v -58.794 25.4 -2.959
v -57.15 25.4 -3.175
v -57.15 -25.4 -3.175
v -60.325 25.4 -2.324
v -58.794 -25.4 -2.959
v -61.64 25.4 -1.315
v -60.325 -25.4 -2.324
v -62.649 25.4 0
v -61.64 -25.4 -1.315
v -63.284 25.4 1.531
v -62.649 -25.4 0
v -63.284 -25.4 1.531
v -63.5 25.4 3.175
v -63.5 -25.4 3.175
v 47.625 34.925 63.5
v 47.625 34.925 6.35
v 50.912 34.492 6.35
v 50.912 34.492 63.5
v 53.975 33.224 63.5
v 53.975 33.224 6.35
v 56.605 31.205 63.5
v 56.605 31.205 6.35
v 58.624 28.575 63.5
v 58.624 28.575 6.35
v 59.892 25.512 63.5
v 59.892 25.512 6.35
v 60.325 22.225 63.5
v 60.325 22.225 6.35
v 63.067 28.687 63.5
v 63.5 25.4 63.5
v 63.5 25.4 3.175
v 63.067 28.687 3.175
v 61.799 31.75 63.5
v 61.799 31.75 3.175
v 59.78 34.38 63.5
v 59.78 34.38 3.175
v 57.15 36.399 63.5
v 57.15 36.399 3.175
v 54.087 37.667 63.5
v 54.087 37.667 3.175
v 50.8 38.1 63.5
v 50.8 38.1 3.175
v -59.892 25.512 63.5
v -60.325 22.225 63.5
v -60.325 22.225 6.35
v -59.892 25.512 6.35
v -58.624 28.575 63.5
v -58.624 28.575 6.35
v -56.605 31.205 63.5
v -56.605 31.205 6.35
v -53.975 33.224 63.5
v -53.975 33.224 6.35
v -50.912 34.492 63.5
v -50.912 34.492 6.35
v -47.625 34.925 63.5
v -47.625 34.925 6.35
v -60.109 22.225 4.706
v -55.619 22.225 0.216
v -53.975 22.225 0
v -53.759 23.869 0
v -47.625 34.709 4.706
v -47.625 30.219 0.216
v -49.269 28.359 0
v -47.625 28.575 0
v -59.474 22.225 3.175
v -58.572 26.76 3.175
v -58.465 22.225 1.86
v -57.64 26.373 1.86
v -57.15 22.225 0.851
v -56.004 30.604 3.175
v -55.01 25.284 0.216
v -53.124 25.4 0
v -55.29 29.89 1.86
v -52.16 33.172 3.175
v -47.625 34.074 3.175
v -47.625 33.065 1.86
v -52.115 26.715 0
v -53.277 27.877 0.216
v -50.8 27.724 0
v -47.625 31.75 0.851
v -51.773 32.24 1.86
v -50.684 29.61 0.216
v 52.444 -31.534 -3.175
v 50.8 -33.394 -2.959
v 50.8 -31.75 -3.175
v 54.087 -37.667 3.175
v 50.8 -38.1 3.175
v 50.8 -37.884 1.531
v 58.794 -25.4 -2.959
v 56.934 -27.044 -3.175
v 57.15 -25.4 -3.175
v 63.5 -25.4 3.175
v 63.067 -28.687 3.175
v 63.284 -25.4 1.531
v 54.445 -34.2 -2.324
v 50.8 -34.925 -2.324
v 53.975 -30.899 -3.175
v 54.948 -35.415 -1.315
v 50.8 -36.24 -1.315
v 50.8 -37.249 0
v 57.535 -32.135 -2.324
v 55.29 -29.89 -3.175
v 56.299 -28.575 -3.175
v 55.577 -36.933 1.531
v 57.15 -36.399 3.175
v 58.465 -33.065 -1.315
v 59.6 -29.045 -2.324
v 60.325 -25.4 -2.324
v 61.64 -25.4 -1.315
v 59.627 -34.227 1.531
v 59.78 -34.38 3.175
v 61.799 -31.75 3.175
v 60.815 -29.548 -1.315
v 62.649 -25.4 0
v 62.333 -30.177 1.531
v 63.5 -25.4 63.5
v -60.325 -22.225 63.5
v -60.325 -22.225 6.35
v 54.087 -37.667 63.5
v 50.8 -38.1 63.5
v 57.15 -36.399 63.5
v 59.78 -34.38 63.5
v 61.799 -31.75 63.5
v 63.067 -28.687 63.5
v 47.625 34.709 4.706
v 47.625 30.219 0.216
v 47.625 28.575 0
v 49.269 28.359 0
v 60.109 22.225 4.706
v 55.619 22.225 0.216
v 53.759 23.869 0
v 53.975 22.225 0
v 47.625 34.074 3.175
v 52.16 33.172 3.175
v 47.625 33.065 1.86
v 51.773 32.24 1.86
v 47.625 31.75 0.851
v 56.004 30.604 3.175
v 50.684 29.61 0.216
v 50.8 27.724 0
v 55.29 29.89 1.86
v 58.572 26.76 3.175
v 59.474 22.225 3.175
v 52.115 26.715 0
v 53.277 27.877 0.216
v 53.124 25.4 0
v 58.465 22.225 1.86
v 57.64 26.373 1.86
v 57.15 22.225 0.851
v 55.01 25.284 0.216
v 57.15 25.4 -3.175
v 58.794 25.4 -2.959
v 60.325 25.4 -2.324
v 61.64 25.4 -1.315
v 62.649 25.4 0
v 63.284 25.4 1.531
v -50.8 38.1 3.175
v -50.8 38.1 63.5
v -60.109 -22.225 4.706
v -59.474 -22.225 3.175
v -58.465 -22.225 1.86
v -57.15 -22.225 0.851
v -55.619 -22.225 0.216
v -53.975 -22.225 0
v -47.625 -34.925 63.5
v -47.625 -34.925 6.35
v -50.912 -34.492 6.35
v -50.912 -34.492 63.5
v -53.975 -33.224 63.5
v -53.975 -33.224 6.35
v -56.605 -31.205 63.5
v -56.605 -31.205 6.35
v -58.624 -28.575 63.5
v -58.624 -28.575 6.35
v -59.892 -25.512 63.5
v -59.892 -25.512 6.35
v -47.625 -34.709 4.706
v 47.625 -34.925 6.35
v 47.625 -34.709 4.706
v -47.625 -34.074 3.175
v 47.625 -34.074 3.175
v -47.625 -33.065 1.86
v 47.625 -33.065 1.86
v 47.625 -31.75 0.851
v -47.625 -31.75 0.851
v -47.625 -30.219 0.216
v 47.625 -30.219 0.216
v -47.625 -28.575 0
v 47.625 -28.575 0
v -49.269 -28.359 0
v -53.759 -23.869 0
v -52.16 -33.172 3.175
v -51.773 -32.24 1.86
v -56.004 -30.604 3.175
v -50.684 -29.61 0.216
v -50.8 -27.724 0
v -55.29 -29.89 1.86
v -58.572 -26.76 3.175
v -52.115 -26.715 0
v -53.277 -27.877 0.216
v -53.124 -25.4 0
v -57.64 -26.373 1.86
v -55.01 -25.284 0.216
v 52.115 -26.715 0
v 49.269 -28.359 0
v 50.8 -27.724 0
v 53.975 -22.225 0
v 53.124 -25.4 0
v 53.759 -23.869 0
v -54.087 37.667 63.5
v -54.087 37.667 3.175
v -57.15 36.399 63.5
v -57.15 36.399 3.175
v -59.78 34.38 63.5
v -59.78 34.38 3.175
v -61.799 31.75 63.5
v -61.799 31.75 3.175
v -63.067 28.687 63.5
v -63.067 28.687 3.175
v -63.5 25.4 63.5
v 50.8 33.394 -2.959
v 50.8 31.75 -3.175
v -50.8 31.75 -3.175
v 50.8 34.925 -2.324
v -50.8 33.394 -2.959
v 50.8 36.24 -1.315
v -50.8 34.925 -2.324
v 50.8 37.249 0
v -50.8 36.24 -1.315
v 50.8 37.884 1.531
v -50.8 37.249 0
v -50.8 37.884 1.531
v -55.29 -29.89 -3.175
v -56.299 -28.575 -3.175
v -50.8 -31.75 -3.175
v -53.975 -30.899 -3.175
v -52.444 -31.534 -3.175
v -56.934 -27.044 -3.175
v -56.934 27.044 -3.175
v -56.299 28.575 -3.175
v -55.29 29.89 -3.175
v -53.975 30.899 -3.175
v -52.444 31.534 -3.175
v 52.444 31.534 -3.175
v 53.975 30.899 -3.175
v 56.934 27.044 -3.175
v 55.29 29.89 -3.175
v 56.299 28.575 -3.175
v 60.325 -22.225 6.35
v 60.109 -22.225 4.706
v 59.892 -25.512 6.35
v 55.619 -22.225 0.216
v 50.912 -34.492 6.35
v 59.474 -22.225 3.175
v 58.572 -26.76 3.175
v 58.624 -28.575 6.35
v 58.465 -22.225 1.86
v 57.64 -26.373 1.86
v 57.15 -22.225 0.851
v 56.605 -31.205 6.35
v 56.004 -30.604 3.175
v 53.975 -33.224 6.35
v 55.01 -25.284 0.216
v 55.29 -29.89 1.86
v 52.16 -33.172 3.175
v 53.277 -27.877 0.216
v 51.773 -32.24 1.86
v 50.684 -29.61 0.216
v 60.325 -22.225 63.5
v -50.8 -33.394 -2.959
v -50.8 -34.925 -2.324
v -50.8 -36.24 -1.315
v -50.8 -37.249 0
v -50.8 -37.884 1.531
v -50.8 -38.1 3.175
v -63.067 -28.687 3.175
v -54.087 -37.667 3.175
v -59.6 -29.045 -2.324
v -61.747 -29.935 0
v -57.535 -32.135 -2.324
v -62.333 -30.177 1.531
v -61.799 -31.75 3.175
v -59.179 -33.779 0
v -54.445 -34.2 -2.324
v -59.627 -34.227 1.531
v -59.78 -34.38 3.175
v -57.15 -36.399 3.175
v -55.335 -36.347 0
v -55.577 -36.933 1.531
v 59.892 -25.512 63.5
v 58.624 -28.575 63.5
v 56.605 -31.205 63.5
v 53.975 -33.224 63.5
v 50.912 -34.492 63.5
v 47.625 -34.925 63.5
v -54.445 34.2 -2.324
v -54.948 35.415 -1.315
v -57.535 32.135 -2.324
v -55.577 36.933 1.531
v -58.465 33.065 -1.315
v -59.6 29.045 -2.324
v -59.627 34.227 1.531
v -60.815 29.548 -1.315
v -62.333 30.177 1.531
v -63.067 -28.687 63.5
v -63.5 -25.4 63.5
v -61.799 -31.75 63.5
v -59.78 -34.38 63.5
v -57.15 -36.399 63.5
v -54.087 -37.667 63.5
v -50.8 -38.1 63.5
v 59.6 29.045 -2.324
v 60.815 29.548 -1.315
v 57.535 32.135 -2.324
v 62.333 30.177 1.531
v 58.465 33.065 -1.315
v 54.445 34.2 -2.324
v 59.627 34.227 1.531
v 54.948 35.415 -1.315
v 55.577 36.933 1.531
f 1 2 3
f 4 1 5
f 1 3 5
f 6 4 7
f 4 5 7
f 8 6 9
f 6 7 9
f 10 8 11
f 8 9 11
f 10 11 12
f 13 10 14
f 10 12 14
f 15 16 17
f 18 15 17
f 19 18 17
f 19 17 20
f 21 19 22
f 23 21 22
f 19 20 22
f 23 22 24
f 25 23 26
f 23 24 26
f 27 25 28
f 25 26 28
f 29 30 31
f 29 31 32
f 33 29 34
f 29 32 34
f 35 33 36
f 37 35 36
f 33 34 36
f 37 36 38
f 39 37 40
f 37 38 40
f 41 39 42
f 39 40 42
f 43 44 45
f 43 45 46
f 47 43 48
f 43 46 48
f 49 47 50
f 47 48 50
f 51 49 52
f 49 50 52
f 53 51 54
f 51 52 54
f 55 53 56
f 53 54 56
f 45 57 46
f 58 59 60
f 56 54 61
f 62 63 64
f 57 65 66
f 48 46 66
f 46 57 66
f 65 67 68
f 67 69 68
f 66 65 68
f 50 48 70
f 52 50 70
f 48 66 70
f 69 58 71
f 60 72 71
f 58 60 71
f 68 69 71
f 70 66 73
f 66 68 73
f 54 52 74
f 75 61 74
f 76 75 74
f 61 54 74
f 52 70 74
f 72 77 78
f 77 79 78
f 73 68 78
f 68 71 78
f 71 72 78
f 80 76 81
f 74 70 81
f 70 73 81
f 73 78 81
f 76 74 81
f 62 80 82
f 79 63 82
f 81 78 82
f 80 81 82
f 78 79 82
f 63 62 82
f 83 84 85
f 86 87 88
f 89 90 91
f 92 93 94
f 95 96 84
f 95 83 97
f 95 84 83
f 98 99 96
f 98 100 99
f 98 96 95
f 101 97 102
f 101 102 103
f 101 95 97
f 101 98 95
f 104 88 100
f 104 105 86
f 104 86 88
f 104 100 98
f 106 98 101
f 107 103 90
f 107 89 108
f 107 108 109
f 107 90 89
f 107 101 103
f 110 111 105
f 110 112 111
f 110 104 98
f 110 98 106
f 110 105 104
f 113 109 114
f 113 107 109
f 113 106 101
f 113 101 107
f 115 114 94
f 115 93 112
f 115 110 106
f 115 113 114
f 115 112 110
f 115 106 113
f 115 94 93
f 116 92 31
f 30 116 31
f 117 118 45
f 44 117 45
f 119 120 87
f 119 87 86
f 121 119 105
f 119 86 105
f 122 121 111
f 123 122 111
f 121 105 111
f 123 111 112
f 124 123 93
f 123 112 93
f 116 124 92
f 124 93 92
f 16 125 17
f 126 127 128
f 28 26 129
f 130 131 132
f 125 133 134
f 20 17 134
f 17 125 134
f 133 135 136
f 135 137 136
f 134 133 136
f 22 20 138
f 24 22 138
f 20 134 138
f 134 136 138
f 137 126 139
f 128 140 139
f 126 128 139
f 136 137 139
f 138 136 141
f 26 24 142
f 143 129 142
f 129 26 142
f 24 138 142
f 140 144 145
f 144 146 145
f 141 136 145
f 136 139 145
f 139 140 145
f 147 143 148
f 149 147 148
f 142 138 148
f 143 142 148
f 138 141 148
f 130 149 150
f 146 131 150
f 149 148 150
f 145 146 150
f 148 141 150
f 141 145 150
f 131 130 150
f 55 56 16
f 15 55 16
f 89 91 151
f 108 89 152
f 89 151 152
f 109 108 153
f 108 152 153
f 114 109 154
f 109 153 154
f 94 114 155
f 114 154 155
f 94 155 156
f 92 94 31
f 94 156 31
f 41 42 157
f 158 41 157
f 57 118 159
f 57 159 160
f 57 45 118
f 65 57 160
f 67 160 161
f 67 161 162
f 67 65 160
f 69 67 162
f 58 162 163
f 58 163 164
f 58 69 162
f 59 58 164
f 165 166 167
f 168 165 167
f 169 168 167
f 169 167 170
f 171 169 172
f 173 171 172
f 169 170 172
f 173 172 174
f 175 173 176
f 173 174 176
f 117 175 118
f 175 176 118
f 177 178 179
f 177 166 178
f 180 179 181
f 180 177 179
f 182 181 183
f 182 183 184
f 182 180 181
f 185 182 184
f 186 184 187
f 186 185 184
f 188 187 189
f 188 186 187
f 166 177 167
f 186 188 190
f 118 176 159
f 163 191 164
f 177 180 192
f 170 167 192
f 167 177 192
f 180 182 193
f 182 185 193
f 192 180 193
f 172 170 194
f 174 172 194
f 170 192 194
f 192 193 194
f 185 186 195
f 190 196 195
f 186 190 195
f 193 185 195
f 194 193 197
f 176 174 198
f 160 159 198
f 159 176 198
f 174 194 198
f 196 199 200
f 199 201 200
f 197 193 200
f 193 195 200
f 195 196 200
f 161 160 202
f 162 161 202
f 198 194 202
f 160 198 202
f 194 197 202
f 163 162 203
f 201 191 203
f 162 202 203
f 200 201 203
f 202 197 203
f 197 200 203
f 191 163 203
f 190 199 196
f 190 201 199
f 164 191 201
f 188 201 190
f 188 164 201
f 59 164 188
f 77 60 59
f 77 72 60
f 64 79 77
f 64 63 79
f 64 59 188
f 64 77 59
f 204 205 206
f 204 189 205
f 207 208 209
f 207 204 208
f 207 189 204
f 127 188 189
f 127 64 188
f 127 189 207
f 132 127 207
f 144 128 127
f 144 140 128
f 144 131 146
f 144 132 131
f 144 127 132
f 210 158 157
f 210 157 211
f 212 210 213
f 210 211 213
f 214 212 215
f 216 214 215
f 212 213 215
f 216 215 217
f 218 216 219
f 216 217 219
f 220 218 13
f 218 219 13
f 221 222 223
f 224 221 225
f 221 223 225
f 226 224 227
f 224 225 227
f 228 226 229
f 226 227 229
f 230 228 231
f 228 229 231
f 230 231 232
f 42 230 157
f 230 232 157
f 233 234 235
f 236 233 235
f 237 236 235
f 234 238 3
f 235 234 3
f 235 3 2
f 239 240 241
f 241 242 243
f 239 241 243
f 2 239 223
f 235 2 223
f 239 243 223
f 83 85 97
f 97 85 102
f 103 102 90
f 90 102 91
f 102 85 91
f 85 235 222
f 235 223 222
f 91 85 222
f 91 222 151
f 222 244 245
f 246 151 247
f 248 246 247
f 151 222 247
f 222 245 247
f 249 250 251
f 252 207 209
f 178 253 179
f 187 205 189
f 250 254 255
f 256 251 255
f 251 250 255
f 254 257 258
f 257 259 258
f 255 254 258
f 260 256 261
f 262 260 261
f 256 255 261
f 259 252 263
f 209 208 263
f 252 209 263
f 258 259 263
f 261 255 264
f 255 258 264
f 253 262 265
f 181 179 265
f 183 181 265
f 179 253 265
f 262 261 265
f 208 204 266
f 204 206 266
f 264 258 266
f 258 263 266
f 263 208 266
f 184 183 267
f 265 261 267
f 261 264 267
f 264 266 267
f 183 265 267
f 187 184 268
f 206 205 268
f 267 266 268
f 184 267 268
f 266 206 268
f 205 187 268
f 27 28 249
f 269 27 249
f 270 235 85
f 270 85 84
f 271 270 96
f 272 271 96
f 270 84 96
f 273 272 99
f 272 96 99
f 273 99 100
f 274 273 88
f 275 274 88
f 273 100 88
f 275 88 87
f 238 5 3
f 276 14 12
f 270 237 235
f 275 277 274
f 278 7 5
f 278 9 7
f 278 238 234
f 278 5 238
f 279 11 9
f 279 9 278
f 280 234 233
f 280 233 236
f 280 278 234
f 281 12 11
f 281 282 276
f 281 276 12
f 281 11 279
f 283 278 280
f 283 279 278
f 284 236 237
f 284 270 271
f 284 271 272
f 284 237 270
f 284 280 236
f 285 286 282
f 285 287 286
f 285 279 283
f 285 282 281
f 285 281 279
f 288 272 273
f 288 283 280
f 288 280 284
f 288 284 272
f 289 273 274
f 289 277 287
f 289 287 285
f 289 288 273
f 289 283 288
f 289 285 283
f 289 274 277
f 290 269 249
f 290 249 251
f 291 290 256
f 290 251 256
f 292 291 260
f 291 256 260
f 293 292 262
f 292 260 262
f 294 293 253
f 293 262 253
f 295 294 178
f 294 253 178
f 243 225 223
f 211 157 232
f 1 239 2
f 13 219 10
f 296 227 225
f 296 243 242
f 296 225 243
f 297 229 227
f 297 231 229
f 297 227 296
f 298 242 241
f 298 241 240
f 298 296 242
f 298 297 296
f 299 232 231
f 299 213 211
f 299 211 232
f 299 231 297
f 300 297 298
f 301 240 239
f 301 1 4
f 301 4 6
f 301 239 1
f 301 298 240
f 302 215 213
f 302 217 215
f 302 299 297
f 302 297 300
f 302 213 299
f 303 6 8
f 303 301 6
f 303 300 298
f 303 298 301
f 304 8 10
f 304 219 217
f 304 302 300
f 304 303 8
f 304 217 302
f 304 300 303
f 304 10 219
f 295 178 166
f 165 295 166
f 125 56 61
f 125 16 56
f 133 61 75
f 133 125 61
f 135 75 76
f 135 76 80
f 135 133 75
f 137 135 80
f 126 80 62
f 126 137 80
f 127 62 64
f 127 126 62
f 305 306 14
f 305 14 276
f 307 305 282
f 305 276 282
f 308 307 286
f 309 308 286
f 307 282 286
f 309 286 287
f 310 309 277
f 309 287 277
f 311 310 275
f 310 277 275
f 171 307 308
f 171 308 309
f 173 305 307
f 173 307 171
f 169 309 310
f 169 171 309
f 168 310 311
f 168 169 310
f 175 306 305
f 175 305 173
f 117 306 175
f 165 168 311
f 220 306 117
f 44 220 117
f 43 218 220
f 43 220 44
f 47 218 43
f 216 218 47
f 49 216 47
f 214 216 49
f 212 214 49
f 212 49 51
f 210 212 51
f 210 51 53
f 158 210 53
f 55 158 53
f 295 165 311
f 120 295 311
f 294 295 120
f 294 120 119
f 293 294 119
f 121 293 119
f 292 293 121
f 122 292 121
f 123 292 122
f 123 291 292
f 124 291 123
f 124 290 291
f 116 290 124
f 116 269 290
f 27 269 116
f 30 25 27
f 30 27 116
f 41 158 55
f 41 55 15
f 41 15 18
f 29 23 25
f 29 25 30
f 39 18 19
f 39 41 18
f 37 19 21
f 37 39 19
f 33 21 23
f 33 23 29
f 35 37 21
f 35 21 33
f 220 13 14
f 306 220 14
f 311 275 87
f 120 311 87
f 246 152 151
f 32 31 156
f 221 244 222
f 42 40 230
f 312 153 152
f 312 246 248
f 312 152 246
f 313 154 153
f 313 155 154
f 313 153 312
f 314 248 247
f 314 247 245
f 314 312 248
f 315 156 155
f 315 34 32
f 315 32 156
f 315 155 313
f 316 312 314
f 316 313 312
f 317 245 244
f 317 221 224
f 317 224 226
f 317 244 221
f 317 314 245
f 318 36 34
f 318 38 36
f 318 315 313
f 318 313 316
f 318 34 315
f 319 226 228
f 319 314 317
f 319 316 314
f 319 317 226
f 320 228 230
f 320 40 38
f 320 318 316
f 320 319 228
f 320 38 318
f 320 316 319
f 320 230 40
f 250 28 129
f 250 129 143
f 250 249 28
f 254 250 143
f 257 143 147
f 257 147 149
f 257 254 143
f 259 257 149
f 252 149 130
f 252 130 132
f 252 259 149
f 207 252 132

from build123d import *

# Parameters (mm, degrees)
F1_DEPTH = 3.175
F2_DEPTH = 63.5
F3_R     = 6.35


with BuildPart() as f1:
    # F0 (on Top) → F1 (new body)
    with BuildSketch(Plane.XY):
        with BuildLine():
            ThreePointArc((63.5, 25.4), (59.7802561211, 34.3802561211), (50.8, 38.1))
            Line((50.8, 38.1), (-50.8, 38.1))
            ThreePointArc((-50.8, 38.1), (-59.7802561211, 34.3802561211), (-63.5, 25.4))
            Line((-63.5, 25.4), (-63.5, -25.4))
            ThreePointArc((-63.5, -25.4), (-59.7802561211, -34.3802561211), (-50.8, -38.1))
            Line((-50.8, -38.1), (50.8, -38.1))
            ThreePointArc((50.8, -38.1), (59.7802561211, -34.3802561211), (63.5, -25.4))
            Line((63.5, -25.4), (63.5, 25.4))
        make_face()
        with BuildLine():
            Line((-47.625, 34.925), (47.625, 34.925))
            ThreePointArc((47.625, 34.925), (56.6052561211, 31.2052561211), (60.325, 22.225))
            Line((60.325, 22.225), (60.325, -22.225))
            ThreePointArc((60.325, -22.225), (56.6052561211, -31.2052561211), (47.625, -34.925))
            Line((47.625, -34.925), (-47.625, -34.925))
            ThreePointArc((-47.625, -34.925), (-56.6052561211, -31.2052561211), (-60.325, -22.225))
            Line((-60.325, -22.225), (-60.325, 22.225))
            ThreePointArc((-60.325, 22.225), (-56.6052561211, 31.2052561211), (-47.625, 34.925))
        make_face(mode=Mode.SUBTRACT)
        with BuildLine():
            ThreePointArc((60.325, 22.225), (56.6052561211, 31.2052561211), (47.625, 34.925))
            Line((47.625, 34.925), (-47.625, 34.925))
            ThreePointArc((-47.625, 34.925), (-56.6052561211, 31.2052561211), (-60.325, 22.225))
            Line((-60.325, 22.225), (-60.325, -22.225))
            ThreePointArc((-60.325, -22.225), (-56.6052561211, -31.2052561211), (-47.625, -34.925))
            Line((-47.625, -34.925), (47.625, -34.925))
            ThreePointArc((47.625, -34.925), (56.6052561211, -31.2052561211), (60.325, -22.225))
            Line((60.325, -22.225), (60.325, 22.225))
        make_face()
    extrude(amount=-F1_DEPTH)

    # F0 (on Top) → F2 (join)
    with BuildSketch(Plane.XY):
        with BuildLine():
            ThreePointArc((63.5, 25.4), (59.7802561211, 34.3802561211), (50.8, 38.1))
            Line((50.8, 38.1), (-50.8, 38.1))
            ThreePointArc((-50.8, 38.1), (-59.7802561211, 34.3802561211), (-63.5, 25.4))
            Line((-63.5, 25.4), (-63.5, -25.4))
            ThreePointArc((-63.5, -25.4), (-59.7802561211, -34.3802561211), (-50.8, -38.1))
            Line((-50.8, -38.1), (50.8, -38.1))
            ThreePointArc((50.8, -38.1), (59.7802561211, -34.3802561211), (63.5, -25.4))
            Line((63.5, -25.4), (63.5, 25.4))
        make_face()
        with BuildLine():
            Line((-47.625, 34.925), (47.625, 34.925))
            ThreePointArc((47.625, 34.925), (56.6052561211, 31.2052561211), (60.325, 22.225))
            Line((60.325, 22.225), (60.325, -22.225))
            ThreePointArc((60.325, -22.225), (56.6052561211, -31.2052561211), (47.625, -34.925))
            Line((47.625, -34.925), (-47.625, -34.925))
            ThreePointArc((-47.625, -34.925), (-56.6052561211, -31.2052561211), (-60.325, -22.225))
            Line((-60.325, -22.225), (-60.325, 22.225))
            ThreePointArc((-60.325, 22.225), (-56.6052561211, 31.2052561211), (-47.625, 34.925))
        make_face(mode=Mode.SUBTRACT)
    extrude(amount=F2_DEPTH)

    # F3
    f3_edges = [f1.edges().sort_by_distance(p)[0] for p in [
        (0, 34.925, 0),
        (0, -38.1, -3.175),
    ]]
    fillet(f3_edges, radius=F3_R)


solid = f1.part
